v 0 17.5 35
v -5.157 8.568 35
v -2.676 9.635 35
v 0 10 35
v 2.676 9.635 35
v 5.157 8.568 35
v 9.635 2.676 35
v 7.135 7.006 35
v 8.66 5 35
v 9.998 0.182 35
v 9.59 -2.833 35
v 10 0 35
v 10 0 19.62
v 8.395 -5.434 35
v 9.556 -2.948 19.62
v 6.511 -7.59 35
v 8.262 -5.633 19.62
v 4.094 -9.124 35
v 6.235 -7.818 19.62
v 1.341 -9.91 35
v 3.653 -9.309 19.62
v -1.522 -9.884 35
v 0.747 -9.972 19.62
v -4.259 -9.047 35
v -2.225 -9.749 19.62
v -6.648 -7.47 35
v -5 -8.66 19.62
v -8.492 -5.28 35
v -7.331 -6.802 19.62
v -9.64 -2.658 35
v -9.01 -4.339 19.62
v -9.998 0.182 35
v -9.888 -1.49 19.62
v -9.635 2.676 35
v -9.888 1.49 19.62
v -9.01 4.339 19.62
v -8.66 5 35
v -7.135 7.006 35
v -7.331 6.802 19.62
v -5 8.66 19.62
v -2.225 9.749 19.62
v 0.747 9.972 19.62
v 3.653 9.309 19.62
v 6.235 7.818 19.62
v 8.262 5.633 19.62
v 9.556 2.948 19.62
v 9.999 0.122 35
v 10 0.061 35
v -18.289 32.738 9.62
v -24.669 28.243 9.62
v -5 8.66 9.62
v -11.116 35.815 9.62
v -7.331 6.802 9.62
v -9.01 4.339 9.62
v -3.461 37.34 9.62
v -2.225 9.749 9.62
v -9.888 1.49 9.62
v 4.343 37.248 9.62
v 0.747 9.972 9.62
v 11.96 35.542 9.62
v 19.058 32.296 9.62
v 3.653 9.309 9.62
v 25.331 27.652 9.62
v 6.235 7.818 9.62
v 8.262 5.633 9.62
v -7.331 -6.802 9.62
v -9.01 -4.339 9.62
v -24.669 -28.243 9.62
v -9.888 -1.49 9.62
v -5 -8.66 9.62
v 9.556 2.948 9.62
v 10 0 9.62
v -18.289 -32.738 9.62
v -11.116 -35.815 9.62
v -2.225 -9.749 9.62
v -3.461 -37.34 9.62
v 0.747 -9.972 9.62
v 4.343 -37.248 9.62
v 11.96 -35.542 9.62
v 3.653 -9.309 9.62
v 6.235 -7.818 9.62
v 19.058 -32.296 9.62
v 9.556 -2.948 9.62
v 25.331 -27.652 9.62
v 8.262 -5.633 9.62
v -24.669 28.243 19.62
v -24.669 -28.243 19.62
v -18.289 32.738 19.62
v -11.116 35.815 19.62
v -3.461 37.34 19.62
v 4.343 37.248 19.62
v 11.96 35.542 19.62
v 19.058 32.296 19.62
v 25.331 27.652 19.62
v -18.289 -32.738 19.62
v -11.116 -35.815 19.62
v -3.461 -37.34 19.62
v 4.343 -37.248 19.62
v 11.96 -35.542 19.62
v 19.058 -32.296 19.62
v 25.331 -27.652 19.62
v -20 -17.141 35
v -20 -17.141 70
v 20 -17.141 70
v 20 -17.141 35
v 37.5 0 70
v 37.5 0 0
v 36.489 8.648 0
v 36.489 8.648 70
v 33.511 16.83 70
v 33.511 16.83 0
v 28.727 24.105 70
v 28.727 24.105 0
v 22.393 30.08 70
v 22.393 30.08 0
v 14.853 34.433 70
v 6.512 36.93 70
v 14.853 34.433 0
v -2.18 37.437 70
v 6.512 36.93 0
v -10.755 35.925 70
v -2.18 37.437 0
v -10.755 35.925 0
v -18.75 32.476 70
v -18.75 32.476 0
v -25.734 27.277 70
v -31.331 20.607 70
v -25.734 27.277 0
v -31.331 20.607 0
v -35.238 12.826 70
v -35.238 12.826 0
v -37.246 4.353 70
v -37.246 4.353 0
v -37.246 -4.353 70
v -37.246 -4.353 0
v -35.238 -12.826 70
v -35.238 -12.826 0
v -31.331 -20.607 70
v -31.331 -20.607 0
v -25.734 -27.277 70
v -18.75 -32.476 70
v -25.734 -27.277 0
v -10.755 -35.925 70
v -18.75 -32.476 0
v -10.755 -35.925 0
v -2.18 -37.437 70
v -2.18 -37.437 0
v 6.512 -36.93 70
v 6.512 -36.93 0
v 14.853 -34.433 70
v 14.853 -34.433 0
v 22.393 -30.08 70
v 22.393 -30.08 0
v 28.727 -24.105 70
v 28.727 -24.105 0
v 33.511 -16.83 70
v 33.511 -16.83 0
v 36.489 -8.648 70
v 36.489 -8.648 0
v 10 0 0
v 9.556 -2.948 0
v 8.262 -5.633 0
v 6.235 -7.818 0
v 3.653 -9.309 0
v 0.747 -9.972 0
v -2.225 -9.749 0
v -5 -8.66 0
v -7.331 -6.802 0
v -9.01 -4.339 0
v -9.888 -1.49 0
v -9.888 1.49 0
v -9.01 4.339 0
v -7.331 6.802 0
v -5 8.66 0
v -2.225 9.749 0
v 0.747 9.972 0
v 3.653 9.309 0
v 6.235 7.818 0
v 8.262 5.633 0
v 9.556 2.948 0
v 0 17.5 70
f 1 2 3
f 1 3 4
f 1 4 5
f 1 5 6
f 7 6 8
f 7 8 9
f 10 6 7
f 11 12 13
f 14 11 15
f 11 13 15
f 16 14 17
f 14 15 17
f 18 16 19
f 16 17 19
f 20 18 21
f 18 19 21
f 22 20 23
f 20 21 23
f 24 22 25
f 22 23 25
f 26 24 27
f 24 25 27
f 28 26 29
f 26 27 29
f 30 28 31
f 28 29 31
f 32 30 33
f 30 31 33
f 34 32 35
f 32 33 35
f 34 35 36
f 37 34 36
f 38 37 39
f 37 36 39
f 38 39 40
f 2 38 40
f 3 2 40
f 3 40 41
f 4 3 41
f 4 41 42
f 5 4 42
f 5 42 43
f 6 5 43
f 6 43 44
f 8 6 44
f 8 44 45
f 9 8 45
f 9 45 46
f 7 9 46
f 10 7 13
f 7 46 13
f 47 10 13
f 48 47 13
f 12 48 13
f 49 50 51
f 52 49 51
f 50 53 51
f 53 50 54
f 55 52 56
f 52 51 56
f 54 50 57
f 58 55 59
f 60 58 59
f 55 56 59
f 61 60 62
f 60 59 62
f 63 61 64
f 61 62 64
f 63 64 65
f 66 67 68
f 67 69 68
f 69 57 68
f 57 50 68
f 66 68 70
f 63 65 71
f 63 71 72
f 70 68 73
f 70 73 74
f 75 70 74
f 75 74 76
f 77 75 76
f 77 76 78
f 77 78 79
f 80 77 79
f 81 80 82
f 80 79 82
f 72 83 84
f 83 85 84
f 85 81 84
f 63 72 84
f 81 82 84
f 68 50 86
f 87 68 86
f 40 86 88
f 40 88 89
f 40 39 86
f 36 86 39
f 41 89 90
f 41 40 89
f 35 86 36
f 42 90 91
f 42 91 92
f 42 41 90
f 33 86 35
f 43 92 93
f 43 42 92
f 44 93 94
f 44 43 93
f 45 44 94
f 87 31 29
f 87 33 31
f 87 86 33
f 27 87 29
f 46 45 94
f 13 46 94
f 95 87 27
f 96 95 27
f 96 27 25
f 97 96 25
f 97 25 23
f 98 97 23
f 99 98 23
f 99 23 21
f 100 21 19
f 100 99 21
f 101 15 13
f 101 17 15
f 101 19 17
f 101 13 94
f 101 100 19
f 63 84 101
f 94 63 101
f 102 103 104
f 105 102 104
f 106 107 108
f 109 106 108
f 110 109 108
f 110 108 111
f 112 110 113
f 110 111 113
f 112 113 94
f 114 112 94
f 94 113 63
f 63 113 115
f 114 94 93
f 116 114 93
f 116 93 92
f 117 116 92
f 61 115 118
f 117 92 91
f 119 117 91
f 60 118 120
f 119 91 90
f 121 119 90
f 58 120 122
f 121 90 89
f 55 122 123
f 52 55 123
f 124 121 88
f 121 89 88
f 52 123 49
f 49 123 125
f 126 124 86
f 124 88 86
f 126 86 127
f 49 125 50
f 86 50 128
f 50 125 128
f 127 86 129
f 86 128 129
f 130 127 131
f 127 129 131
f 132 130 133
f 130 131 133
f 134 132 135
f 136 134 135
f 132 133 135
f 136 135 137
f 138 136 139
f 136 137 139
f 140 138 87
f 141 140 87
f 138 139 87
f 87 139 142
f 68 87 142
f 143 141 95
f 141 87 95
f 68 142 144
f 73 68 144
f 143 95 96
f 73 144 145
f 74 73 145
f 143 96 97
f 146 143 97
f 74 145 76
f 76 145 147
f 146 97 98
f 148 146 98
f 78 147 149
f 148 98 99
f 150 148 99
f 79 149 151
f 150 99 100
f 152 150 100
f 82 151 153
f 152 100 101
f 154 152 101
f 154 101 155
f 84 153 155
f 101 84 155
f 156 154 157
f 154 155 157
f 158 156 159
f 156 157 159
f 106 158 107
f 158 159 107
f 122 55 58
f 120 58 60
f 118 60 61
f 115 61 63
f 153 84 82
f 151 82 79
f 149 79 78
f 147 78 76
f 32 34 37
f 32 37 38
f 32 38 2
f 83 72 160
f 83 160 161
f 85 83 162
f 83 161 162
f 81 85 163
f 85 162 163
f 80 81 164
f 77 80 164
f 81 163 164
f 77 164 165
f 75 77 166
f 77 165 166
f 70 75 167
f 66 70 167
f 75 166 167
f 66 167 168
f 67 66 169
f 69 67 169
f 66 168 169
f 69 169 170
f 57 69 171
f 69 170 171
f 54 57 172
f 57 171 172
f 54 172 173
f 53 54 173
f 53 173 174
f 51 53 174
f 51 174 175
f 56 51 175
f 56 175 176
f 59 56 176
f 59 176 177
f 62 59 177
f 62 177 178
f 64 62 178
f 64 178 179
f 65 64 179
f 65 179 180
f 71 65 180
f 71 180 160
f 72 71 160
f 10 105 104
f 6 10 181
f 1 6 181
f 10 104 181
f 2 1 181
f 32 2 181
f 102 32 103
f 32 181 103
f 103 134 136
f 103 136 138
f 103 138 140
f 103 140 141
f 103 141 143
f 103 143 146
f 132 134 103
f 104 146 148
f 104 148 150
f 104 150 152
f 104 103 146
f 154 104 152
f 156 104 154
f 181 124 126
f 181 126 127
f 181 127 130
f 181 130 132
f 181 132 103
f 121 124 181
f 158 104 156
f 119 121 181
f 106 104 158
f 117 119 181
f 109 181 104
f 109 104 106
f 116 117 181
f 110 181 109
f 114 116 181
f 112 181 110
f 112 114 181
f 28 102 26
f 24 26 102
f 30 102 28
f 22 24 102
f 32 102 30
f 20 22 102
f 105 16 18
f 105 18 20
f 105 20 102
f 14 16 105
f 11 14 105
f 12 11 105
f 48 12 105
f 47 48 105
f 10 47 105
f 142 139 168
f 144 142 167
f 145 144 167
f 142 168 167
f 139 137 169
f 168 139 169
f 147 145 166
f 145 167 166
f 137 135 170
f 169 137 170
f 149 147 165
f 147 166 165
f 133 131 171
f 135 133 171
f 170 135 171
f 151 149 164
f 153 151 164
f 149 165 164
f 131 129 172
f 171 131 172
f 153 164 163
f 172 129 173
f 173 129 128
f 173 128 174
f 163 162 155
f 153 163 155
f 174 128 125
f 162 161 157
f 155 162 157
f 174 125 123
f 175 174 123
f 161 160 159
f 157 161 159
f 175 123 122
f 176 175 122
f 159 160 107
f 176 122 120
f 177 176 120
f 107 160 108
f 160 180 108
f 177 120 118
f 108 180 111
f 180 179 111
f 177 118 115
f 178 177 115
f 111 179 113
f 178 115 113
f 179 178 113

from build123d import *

# Parameters (mm, degrees)
F0_R     = 37.5
F1_DEPTH = 70
F2_R     = 10
F3_DEPTH = 35
F5_DEPTH = 35
F7_W     = 50
F7_H     = 10
F6_DEPTH = 40


with BuildPart() as f1:
    # F0 (on Top) → F1 (new body)
    with BuildSketch(Plane.XY):
        Circle(F0_R)
    extrude(amount=F1_DEPTH)

    # F2 (on face) → F3 (cut)
    with BuildSketch(Plane(origin=(0, 0, 0), x_dir=(1, 0, 0), z_dir=(0, 0, -1))):
        Circle(F2_R)
    extrude(amount=-F3_DEPTH, mode=Mode.SUBTRACT)

    # F4 (on face) → F5 (cut)
    with BuildSketch(Plane.XY.offset(70)):
        Polygon((0, 17.5), (-20, -17.141016), (20, -17.141016), align=None)
    extrude(amount=-F5_DEPTH, mode=Mode.SUBTRACT)

    # F7 (on Front) → F6 (cut, symmetric)
    with BuildSketch(Plane.XZ):
        with Locations((0.330579, 14.619615)):
            Rectangle(F7_W, F7_H)
    extrude(amount=F6_DEPTH, both=True, mode=Mode.SUBTRACT)


solid = f1.part
